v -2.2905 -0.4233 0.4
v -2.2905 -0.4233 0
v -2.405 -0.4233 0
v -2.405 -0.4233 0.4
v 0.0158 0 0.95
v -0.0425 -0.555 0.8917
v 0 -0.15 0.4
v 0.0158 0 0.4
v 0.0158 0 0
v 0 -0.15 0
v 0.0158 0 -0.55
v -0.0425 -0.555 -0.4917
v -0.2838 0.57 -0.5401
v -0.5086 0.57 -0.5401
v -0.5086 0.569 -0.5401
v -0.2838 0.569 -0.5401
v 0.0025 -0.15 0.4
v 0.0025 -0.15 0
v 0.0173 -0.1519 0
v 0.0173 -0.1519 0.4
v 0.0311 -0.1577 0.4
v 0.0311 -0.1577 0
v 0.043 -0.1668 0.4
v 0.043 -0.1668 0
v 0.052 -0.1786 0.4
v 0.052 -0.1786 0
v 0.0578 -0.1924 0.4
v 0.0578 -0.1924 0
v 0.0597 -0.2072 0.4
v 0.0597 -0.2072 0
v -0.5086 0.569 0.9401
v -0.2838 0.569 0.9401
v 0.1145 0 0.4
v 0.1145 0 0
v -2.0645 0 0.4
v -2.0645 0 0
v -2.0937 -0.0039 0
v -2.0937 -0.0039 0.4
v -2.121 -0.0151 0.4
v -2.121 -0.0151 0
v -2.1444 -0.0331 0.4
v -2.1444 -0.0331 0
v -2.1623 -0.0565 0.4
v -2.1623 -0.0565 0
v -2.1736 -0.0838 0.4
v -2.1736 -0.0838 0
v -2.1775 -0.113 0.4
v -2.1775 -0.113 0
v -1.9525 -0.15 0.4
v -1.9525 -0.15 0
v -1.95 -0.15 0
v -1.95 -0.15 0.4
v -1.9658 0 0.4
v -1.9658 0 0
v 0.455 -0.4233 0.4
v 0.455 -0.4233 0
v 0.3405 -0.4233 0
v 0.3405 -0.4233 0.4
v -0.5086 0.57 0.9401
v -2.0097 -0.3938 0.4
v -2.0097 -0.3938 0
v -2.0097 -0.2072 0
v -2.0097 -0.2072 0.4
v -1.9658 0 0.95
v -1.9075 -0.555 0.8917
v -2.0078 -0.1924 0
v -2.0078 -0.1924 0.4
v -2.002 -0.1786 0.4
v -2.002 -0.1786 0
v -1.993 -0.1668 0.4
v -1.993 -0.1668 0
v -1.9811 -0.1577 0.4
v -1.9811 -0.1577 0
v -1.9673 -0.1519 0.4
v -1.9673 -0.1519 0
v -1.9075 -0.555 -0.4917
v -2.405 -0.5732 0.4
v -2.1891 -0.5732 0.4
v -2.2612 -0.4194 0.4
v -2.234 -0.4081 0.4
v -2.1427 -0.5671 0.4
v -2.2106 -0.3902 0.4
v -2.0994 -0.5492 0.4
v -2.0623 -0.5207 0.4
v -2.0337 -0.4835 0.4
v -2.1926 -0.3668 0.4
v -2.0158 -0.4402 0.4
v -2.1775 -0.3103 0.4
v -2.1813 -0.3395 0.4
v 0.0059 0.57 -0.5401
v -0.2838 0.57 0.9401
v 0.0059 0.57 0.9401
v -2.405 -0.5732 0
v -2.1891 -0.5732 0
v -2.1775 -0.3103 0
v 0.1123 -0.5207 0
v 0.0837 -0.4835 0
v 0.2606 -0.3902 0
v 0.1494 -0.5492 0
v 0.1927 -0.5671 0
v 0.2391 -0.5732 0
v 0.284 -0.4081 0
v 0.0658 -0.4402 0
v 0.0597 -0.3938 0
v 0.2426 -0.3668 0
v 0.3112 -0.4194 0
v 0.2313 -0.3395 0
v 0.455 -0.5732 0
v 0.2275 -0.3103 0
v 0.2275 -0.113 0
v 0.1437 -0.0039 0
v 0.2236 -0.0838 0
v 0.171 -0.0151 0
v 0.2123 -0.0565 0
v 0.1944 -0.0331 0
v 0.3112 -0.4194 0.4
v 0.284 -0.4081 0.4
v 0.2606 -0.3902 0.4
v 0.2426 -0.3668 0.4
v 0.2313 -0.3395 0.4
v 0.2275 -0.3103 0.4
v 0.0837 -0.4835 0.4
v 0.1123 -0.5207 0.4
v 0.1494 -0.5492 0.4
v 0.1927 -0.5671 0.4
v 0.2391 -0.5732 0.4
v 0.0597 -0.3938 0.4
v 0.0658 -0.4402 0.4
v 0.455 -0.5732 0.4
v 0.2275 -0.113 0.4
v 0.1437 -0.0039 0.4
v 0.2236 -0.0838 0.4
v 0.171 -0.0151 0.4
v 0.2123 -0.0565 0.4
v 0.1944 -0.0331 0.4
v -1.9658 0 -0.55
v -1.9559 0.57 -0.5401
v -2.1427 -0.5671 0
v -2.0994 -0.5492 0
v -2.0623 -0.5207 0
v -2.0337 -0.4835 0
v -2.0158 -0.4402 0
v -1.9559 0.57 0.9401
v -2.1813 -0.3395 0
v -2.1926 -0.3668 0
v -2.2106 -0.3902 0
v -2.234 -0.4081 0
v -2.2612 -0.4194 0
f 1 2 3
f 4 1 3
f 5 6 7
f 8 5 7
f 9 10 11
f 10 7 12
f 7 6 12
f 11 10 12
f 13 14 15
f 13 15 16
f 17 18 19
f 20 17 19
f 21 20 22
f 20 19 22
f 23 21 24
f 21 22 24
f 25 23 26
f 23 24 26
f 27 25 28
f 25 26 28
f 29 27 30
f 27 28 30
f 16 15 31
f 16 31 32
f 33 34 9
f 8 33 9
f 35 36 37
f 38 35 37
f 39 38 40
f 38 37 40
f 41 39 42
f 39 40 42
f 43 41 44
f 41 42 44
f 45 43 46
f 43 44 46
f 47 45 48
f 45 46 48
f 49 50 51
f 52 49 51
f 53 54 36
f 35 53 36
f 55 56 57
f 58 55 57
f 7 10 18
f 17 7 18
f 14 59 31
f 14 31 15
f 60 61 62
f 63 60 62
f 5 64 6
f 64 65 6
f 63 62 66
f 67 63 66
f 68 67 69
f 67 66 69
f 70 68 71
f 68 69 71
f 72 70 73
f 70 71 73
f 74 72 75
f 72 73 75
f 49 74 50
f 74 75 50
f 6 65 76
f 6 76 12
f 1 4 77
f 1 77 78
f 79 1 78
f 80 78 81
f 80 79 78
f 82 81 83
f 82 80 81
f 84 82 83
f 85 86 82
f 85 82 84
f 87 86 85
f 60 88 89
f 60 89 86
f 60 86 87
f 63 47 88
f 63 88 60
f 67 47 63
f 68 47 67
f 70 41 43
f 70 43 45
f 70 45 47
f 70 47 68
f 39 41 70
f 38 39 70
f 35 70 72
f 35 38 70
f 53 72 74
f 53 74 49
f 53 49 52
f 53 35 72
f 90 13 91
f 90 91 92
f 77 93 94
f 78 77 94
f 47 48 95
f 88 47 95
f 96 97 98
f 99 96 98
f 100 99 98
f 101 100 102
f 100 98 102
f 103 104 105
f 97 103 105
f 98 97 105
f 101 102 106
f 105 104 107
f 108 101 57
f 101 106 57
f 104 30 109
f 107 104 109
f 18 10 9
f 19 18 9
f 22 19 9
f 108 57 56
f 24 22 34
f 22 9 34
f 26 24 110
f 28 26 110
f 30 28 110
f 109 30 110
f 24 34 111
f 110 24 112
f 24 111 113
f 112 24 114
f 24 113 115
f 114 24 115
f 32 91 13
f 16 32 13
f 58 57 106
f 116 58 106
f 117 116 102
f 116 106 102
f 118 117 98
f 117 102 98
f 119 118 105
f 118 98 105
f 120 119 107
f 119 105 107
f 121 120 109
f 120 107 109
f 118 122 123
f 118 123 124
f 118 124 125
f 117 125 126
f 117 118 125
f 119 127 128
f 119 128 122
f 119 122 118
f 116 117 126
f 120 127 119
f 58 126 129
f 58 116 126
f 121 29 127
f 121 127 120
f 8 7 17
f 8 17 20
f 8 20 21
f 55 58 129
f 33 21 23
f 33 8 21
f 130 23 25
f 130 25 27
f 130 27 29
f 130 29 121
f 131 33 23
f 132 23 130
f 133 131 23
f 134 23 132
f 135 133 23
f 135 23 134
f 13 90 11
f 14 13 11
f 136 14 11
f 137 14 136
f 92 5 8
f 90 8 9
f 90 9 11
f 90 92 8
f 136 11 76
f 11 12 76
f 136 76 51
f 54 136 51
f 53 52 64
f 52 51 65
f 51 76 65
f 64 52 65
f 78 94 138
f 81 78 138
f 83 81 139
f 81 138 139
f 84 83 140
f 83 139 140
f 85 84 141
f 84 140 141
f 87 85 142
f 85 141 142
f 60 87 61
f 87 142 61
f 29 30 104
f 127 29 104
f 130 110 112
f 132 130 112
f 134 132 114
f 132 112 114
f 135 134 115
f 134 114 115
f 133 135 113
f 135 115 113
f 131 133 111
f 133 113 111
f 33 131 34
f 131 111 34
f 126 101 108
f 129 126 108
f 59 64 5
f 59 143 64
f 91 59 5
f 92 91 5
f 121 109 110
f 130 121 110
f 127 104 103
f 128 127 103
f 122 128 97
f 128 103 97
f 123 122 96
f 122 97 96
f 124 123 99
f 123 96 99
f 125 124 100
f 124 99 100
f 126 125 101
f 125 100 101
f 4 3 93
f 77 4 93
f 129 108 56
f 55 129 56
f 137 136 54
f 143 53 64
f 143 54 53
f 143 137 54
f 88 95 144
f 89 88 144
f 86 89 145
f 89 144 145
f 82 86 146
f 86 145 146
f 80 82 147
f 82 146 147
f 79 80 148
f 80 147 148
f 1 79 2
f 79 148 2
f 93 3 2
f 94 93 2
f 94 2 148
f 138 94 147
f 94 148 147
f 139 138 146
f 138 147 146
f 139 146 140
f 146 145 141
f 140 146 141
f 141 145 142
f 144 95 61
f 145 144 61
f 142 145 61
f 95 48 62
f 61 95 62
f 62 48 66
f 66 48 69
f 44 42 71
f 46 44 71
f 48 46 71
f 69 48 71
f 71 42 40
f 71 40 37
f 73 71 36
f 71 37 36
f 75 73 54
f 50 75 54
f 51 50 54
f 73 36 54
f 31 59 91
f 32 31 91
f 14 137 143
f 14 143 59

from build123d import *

# Parameters (mm, degrees)
SALIENTE_EXTRUIR1_DEPTH           = 0.4
CROQUIS2_W                        = 1.98162794
CROQUIS2_H                        = 1.5
SALIENTE_EXTRUIR2_DEPTH           = 0.57
SALIENTE_EXTRUIR2_TAPER           = 1
SALIENTE_EXTRUIR2_OTHER_WAY_DEPTH = 0.555
SALIENTE_EXTRUIR2_OTHER_WAY_TAPER = 6
CROQUIS3_W                        = 0.224871427
CROQUIS3_H                        = 1.480101226
CORTAR_EXTRUIR1_DEPTH             = 0.001


with BuildPart() as part:
    # Croquis1 → Saliente-Extruir1 (new body)
    with BuildSketch(Plane.XY):
        with BuildLine():
            Line((0, 0), (-1.95, 0))
            Line((-1.95, 0), (-2.064476059, 0))
            ThreePointArc((-2.064476059, 0), (-2.144382121, -0.033098174), (-2.177480296, -0.113004236))
            Line((-2.177480296, -0.113004236), (-2.177480296, -0.15))
            Line((-2.177480296, -0.15), (-2.177480296, -0.310274433))
            ThreePointArc((-2.177480296, -0.310274433), (-2.21057847, -0.390180495), (-2.290484532, -0.42327867))
            Line((-2.290484532, -0.42327867), (-2.404960591, -0.42327867))
            Line((-2.404960591, -0.42327867), (-2.404960591, -0.573201369))
            Line((-2.404960591, -0.573201369), (-2.189097343, -0.573201369))
            ThreePointArc((-2.189097343, -0.573201369), (-2.062251222, -0.520659985), (-2.009709838, -0.393813864))
            Line((-2.009709838, -0.393813864), (-2.009709838, -0.207208661))
            ThreePointArc((-2.009709838, -0.207208661), (-1.992953809, -0.166756029), (-1.952501178, -0.15))
            Line((-1.952501178, -0.15), (-1.95, -0.15))
            Line((-1.95, -0.15), (0, -0.15))
            Line((0, -0.15), (0.002501178, -0.15))
            ThreePointArc((0.002501178, -0.15), (0.042953809, -0.166756029), (0.059709838, -0.207208661))
            Line((0.059709838, -0.207208661), (0.059709838, -0.393813864))
            ThreePointArc((0.059709838, -0.393813864), (0.112251222, -0.520659985), (0.239097343, -0.573201369))
            Line((0.239097343, -0.573201369), (0.454960591, -0.573201369))
            Line((0.454960591, -0.573201369), (0.454960591, -0.42327867))
            Line((0.454960591, -0.42327867), (0.340484532, -0.42327867))
            ThreePointArc((0.340484532, -0.42327867), (0.26057847, -0.390180495), (0.227480296, -0.310274433))
            Line((0.227480296, -0.310274433), (0.227480296, -0.15))
            Line((0.227480296, -0.15), (0.227480296, -0.113004236))
            ThreePointArc((0.227480296, -0.113004236), (0.194382121, -0.033098174), (0.114476059, 0))
            Line((0.114476059, 0), (0, 0))
        make_face()
    extrude(amount=SALIENTE_EXTRUIR1_DEPTH)

    # Croquis2 → Saliente-Extruir2 (add)
    with BuildSketch(Plane(origin=(0, 0, 0), x_dir=(1, 0, 0), z_dir=(0, 1, 0))):
        with Locations((-0.975, -0.2)):
            Rectangle(CROQUIS2_W, CROQUIS2_H)
    extrude(amount=SALIENTE_EXTRUIR2_DEPTH, taper=SALIENTE_EXTRUIR2_TAPER)

    # Croquis2 → Saliente-Extruir2 other way (add)
    with BuildSketch(Plane(origin=(0, 0, 0), x_dir=(1, 0, 0), z_dir=(0, 1, 0))):
        with Locations((-0.975, -0.2)):
            Rectangle(CROQUIS2_W, CROQUIS2_H)
    extrude(amount=-SALIENTE_EXTRUIR2_OTHER_WAY_DEPTH, taper=SALIENTE_EXTRUIR2_OTHER_WAY_TAPER)

    # Croquis3 → Cortar-Extruir1 (cut)
    with BuildSketch(Plane(origin=(0, 0.57, 0), x_dir=(1, 0, 0), z_dir=(0, 1, 0))):
        with Locations((-0.396211414, -0.2)):
            Rectangle(CROQUIS3_W, CROQUIS3_H)
    extrude(amount=-CORTAR_EXTRUIR1_DEPTH, mode=Mode.SUBTRACT)


solid = part.part
